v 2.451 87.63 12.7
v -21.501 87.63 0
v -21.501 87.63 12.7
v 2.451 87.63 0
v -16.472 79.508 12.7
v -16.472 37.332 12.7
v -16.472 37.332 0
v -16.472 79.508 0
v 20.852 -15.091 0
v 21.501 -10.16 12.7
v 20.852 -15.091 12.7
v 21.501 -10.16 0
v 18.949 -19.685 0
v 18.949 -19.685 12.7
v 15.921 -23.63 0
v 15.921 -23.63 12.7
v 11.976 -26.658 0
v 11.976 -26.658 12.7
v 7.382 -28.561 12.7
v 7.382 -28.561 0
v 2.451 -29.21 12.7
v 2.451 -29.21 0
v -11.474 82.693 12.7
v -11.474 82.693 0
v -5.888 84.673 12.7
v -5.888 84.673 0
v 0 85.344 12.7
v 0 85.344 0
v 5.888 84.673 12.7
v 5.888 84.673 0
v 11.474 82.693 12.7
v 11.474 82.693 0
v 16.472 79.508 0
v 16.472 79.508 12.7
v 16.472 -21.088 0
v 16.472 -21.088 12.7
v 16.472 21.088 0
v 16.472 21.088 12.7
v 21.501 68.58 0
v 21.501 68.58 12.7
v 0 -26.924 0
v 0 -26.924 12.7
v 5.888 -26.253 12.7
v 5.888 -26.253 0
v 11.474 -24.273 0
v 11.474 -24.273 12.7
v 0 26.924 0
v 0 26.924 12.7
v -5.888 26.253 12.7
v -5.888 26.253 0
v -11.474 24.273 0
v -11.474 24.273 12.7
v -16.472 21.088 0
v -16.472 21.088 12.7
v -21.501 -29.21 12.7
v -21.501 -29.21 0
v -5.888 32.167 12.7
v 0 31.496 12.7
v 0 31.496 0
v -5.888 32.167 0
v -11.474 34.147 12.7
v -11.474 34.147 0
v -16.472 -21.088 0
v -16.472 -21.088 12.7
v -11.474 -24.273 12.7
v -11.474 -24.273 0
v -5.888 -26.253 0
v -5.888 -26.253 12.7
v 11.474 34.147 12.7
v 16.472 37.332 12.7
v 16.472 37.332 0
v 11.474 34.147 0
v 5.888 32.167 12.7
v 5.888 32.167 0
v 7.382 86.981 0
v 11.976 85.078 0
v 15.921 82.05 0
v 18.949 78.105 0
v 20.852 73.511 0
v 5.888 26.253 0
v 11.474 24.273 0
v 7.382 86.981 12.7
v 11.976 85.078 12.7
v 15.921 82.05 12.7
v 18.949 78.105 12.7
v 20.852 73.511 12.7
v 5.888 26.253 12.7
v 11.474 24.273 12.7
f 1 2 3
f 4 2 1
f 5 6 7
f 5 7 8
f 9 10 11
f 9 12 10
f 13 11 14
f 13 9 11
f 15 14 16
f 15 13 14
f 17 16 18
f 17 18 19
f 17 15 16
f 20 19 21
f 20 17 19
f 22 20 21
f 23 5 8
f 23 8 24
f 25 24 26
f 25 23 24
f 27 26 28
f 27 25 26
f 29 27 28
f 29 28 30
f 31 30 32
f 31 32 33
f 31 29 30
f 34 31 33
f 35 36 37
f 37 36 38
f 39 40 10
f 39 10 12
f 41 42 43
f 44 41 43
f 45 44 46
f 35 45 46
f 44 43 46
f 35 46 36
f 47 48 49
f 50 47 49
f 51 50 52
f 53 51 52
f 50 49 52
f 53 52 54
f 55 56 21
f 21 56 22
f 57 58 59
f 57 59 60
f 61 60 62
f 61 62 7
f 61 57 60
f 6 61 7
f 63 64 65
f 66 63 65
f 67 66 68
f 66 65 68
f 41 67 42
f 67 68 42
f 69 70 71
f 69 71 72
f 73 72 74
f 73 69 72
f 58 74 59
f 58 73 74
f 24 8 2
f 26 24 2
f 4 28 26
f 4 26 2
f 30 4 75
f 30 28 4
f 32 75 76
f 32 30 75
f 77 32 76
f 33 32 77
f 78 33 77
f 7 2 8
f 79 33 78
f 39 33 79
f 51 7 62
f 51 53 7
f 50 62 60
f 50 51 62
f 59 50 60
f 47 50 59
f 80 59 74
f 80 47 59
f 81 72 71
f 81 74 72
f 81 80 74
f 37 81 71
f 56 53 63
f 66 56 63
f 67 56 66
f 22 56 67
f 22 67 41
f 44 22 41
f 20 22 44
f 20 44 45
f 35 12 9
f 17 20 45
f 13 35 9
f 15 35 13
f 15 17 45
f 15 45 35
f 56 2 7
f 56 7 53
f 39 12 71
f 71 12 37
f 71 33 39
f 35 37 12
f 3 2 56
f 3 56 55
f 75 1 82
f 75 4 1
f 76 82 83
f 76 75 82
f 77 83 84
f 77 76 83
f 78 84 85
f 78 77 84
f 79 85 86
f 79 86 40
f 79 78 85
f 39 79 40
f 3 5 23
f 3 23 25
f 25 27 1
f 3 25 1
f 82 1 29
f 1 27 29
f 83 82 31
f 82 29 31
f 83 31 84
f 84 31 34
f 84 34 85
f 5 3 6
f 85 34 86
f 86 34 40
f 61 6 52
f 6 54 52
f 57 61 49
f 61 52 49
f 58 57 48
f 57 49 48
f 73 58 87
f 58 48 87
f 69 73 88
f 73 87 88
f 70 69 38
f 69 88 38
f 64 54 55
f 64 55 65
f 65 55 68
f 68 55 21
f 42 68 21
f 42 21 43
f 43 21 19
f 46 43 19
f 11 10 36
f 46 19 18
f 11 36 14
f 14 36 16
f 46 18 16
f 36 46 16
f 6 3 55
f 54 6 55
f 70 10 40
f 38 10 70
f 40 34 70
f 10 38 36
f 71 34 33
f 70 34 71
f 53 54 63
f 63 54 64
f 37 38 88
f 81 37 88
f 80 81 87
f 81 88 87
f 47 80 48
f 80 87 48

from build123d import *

# Parameters (mm, degrees)
SKETCH1_W           = 47.5742
SKETCH1_H           = 58.42
BOSS_EXTRUDE1_DEPTH = 12.7
CUT_EXTRUDE1_REACH  = 41.753
SKETCH4_W           = 12.7
SKETCH4_H           = 116.84
CUT_EXTRUDE2_DEPTH  = 2.286
SKETCH5_W           = 12.7
SKETCH5_H           = 116.84
CUT_EXTRUDE3_DEPTH  = 2.286
FILLET1_R           = 19.05


with BuildPart() as part:
    # Sketch1 → Boss-Extrude1 (new body)
    with BuildSketch(Plane.XY):
        Rectangle(SKETCH1_W, SKETCH1_H)
    extrude(amount=BOSS_EXTRUDE1_DEPTH)

    # Sketch3 → Cut-Extrude1 (cut, up to next)
    with BuildSketch(Plane.XY.offset(12.7), mode=Mode.PRIVATE) as cut_extrude1_sk1:
        with BuildLine():
            ThreePointArc((-16.471621861, -21.087745183), (-8.737508184, -25.421809301), (0, -26.924))
            Line((0, -26.924), (0, 0))
            Line((0, 0), (0, 26.924))
            ThreePointArc((0, 26.924), (-8.737508184, 25.421809301), (-16.471621861, 21.087745183))
            Line((-16.471621861, 21.087745183), (-16.471621861, -21.087745183))
        make_face()
    cut_extrude1_tool1 = extrude(cut_extrude1_sk1.sketch, amount=-CUT_EXTRUDE1_REACH, mode=Mode.PRIVATE) & part.part
    # Sketch3 → Cut-Extrude1 (cut, up to next)
    with BuildSketch(Plane.XY.offset(12.7), mode=Mode.PRIVATE) as cut_extrude1_sk2:
        with BuildLine():
            Line((0, 0), (0, -26.924))
            ThreePointArc((0, -26.924), (8.737508184, -25.421809301), (16.471621861, -21.087745183))
            Line((16.471621861, -21.087745183), (16.471621861, 21.087745183))
            ThreePointArc((16.471621861, 21.087745183), (8.737508184, 25.421809301), (0, 26.924))
            Line((0, 26.924), (0, 0))
        make_face()
    cut_extrude1_tool2 = extrude(cut_extrude1_sk2.sketch, amount=-CUT_EXTRUDE1_REACH, mode=Mode.PRIVATE) & part.part
    add(cut_extrude1_tool1.solids().sort_by_distance((-7.924897, 0, 12.7))[0], mode=Mode.SUBTRACT)
    add(cut_extrude1_tool2.solids().sort_by_distance((7.924897, 0, 12.7))[0], mode=Mode.SUBTRACT)

    # Mirror1: part across plane


with BuildPart() as part_1:
    add(part.part)
    add(part.part.mirror(Plane(origin=(-23.7871, 29.21, 12.7), x_dir=(0, 0, 1), z_dir=(0, -1, 0))))

    # Sketch4 → Cut-Extrude2 (cut)
    with BuildSketch(Plane(origin=(23.7871, 0, 0), x_dir=(0, 0, -1), z_dir=(1, 0, 0))):
        with Locations((-6.35, 29.21)):
            Rectangle(SKETCH4_W, SKETCH4_H)
    extrude(amount=-CUT_EXTRUDE2_DEPTH, mode=Mode.SUBTRACT)

    # Sketch5 → Cut-Extrude3 (cut)
    with BuildSketch(Plane.ZY.offset(23.7871)):
        with Locations((6.35, 29.21)):
            Rectangle(SKETCH5_W, SKETCH5_H)
    extrude(amount=-CUT_EXTRUDE3_DEPTH, mode=Mode.SUBTRACT)

    # Fillet1
    fillet1_edges = [part_1.edges().sort_by_distance(p)[0] for p in [
        (21.5011, 87.63, 6.35),
        (21.5011, -29.21, 6.35),
    ]]
    fillet(fillet1_edges, radius=FILLET1_R)


solid = part_1.part
